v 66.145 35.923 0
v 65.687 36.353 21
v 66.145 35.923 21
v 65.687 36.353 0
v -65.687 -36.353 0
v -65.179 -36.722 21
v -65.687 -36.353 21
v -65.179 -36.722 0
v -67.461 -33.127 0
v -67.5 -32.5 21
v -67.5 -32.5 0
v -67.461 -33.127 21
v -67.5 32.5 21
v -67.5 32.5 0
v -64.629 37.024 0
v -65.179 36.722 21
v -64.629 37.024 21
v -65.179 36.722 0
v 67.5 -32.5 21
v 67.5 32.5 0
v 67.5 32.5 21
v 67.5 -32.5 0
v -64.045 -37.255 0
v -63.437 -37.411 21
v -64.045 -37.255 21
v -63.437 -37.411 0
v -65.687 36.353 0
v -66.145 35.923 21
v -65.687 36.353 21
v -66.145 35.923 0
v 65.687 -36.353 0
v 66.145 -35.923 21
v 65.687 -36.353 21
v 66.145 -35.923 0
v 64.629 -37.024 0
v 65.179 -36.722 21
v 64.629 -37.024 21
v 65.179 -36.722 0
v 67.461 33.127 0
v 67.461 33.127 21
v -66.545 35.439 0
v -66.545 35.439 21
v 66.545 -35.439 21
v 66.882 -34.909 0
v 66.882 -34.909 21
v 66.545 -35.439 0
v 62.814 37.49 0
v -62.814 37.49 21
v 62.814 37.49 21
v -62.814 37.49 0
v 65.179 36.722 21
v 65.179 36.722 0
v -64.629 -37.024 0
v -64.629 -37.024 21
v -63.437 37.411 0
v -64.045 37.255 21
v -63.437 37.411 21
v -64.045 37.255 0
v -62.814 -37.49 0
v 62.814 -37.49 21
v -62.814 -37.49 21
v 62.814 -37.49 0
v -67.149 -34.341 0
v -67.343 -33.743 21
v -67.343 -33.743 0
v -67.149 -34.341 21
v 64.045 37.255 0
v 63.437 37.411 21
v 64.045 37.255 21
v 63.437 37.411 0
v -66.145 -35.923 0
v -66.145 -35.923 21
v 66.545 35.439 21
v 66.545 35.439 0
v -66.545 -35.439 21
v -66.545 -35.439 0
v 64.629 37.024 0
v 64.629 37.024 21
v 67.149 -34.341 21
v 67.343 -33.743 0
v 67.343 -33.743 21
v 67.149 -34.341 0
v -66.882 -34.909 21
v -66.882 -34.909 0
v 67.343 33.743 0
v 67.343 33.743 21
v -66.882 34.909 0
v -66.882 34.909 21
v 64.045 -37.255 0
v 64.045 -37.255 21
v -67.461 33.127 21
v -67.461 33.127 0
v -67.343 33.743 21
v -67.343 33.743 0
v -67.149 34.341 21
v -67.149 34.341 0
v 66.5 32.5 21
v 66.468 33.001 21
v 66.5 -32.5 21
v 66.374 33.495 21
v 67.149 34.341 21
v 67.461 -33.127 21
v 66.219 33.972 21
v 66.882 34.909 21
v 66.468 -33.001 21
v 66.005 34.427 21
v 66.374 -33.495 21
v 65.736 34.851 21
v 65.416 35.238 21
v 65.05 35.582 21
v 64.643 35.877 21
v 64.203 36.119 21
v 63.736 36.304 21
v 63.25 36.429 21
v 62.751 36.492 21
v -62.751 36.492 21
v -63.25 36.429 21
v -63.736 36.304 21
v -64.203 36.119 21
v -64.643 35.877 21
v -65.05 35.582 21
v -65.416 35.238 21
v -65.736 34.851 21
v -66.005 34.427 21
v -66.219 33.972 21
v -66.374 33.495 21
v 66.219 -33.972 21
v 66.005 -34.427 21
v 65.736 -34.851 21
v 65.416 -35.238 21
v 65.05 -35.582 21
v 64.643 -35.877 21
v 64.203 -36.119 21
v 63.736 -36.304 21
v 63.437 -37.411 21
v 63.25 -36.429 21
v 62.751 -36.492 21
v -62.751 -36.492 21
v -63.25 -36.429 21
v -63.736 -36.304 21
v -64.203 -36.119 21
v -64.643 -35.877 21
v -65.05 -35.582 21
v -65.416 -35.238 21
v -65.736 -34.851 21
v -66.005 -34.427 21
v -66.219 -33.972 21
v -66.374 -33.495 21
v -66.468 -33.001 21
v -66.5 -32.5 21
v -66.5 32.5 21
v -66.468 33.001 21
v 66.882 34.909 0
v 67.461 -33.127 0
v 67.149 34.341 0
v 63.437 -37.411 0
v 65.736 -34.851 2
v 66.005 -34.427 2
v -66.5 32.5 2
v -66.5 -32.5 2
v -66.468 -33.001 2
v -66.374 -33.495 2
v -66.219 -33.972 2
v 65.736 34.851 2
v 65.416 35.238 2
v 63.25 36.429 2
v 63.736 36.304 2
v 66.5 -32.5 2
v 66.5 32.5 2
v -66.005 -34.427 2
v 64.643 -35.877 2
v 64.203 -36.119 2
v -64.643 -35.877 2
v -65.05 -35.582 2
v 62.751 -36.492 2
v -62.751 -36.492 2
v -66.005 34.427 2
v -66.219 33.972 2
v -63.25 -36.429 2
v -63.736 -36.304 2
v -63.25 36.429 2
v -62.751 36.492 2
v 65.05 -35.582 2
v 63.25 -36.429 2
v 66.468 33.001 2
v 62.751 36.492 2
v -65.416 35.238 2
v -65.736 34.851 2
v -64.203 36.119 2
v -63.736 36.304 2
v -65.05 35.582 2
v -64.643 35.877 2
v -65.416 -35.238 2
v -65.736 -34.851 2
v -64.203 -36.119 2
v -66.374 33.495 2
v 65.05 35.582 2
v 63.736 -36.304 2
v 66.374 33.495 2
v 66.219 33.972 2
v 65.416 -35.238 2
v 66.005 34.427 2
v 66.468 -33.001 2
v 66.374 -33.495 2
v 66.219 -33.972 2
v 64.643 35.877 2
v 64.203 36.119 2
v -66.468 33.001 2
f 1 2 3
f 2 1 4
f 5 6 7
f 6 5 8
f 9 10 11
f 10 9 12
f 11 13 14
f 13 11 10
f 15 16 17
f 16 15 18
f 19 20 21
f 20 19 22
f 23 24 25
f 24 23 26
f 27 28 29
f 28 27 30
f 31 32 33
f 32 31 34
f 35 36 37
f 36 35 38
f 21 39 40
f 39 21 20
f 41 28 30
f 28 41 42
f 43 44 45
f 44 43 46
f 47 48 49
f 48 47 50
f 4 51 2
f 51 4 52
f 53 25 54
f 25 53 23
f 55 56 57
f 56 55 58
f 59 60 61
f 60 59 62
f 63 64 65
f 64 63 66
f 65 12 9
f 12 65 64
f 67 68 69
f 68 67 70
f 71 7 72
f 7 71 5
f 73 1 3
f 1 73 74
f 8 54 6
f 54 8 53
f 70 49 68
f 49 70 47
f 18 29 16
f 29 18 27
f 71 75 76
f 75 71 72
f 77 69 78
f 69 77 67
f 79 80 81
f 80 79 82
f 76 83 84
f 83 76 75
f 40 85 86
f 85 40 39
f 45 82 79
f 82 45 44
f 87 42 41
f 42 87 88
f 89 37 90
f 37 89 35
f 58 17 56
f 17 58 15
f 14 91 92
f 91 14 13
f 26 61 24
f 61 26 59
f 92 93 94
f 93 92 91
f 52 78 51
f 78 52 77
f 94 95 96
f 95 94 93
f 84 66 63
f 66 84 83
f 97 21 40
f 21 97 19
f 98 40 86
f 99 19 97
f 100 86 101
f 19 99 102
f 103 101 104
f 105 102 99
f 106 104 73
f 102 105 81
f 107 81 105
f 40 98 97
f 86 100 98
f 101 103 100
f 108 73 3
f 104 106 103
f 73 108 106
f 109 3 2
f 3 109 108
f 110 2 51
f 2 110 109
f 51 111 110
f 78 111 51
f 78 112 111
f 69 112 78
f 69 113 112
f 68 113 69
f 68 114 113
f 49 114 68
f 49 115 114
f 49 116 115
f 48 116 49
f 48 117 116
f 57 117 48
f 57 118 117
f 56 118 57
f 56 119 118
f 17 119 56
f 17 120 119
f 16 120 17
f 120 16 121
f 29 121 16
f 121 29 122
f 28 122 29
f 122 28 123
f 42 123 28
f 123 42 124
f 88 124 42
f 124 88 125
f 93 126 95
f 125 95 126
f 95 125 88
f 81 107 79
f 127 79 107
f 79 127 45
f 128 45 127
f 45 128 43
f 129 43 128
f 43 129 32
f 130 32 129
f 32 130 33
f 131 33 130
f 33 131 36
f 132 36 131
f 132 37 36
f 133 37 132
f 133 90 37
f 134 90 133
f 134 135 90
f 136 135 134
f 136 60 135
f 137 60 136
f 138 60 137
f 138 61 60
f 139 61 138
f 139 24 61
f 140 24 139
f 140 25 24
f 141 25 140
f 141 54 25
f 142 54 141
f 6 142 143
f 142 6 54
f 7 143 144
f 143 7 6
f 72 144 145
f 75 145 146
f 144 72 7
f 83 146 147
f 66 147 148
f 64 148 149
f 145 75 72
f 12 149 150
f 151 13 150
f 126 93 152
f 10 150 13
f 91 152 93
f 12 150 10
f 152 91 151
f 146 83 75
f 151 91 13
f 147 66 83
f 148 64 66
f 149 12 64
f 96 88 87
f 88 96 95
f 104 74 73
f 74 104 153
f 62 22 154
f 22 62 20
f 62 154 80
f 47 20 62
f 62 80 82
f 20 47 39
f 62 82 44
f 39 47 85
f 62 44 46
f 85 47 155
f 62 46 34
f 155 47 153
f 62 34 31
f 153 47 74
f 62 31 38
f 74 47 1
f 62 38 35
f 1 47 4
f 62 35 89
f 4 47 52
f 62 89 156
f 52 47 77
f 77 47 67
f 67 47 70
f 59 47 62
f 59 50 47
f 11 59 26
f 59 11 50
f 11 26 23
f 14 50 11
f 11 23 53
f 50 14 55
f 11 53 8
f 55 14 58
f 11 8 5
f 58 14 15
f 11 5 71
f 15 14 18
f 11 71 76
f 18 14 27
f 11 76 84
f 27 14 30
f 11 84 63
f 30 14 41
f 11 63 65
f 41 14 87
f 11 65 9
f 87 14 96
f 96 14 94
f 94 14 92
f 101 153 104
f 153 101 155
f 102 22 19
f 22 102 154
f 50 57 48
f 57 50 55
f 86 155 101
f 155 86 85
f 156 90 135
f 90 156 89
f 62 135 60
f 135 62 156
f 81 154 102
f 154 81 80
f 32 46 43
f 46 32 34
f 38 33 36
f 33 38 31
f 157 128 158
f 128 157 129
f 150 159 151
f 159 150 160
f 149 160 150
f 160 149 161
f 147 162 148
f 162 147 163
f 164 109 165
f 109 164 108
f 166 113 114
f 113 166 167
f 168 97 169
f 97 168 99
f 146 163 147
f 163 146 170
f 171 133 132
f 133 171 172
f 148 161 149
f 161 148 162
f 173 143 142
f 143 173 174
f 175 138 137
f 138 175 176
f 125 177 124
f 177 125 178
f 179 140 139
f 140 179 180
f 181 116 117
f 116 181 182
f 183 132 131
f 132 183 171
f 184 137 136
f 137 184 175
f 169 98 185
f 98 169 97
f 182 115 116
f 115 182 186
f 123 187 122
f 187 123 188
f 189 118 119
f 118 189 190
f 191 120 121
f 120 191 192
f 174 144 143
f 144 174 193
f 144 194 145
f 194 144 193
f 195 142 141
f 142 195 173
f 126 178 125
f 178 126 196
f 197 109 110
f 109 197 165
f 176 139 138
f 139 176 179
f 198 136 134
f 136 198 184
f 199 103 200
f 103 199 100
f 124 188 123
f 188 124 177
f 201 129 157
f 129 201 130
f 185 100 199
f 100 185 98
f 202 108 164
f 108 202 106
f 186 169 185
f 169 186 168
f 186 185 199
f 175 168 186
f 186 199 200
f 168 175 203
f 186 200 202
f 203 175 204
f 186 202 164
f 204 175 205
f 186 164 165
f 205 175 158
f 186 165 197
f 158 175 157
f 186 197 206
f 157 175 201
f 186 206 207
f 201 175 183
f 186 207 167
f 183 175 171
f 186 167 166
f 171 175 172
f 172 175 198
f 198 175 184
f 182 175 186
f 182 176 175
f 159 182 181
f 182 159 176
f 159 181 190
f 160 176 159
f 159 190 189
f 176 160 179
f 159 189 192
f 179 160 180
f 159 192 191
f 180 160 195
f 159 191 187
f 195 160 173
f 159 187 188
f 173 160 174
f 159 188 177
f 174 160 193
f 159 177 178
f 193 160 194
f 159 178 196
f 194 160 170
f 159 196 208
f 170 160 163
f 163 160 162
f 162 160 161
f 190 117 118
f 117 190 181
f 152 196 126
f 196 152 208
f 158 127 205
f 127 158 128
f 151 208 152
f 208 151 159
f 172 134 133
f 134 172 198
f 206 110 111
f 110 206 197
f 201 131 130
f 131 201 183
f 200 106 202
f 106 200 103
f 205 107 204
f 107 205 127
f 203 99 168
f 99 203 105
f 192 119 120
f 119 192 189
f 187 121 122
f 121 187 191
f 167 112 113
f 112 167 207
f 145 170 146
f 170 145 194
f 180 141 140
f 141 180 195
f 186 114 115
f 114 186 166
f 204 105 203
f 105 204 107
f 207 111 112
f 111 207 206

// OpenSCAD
$fn = 50;


difference() {
	union() {
		hull() {
			translate(v = [-62.5000000000, 32.5000000000, 0]) {
				cylinder(h = 21, r = 5);
			}
			translate(v = [62.5000000000, 32.5000000000, 0]) {
				cylinder(h = 21, r = 5);
			}
			translate(v = [-62.5000000000, -32.5000000000, 0]) {
				cylinder(h = 21, r = 5);
			}
			translate(v = [62.5000000000, -32.5000000000, 0]) {
				cylinder(h = 21, r = 5);
			}
		}
	}
	union() {
		translate(v = [0, 0, 2]) {
			hull() {
				translate(v = [-62.5000000000, 32.5000000000, 0]) {
					cylinder(h = 19, r = 4);
				}
				translate(v = [62.5000000000, 32.5000000000, 0]) {
					cylinder(h = 19, r = 4);
				}
				translate(v = [-62.5000000000, -32.5000000000, 0]) {
					cylinder(h = 19, r = 4);
				}
				translate(v = [62.5000000000, -32.5000000000, 0]) {
					cylinder(h = 19, r = 4);
				}
			}
		}
	}
}
